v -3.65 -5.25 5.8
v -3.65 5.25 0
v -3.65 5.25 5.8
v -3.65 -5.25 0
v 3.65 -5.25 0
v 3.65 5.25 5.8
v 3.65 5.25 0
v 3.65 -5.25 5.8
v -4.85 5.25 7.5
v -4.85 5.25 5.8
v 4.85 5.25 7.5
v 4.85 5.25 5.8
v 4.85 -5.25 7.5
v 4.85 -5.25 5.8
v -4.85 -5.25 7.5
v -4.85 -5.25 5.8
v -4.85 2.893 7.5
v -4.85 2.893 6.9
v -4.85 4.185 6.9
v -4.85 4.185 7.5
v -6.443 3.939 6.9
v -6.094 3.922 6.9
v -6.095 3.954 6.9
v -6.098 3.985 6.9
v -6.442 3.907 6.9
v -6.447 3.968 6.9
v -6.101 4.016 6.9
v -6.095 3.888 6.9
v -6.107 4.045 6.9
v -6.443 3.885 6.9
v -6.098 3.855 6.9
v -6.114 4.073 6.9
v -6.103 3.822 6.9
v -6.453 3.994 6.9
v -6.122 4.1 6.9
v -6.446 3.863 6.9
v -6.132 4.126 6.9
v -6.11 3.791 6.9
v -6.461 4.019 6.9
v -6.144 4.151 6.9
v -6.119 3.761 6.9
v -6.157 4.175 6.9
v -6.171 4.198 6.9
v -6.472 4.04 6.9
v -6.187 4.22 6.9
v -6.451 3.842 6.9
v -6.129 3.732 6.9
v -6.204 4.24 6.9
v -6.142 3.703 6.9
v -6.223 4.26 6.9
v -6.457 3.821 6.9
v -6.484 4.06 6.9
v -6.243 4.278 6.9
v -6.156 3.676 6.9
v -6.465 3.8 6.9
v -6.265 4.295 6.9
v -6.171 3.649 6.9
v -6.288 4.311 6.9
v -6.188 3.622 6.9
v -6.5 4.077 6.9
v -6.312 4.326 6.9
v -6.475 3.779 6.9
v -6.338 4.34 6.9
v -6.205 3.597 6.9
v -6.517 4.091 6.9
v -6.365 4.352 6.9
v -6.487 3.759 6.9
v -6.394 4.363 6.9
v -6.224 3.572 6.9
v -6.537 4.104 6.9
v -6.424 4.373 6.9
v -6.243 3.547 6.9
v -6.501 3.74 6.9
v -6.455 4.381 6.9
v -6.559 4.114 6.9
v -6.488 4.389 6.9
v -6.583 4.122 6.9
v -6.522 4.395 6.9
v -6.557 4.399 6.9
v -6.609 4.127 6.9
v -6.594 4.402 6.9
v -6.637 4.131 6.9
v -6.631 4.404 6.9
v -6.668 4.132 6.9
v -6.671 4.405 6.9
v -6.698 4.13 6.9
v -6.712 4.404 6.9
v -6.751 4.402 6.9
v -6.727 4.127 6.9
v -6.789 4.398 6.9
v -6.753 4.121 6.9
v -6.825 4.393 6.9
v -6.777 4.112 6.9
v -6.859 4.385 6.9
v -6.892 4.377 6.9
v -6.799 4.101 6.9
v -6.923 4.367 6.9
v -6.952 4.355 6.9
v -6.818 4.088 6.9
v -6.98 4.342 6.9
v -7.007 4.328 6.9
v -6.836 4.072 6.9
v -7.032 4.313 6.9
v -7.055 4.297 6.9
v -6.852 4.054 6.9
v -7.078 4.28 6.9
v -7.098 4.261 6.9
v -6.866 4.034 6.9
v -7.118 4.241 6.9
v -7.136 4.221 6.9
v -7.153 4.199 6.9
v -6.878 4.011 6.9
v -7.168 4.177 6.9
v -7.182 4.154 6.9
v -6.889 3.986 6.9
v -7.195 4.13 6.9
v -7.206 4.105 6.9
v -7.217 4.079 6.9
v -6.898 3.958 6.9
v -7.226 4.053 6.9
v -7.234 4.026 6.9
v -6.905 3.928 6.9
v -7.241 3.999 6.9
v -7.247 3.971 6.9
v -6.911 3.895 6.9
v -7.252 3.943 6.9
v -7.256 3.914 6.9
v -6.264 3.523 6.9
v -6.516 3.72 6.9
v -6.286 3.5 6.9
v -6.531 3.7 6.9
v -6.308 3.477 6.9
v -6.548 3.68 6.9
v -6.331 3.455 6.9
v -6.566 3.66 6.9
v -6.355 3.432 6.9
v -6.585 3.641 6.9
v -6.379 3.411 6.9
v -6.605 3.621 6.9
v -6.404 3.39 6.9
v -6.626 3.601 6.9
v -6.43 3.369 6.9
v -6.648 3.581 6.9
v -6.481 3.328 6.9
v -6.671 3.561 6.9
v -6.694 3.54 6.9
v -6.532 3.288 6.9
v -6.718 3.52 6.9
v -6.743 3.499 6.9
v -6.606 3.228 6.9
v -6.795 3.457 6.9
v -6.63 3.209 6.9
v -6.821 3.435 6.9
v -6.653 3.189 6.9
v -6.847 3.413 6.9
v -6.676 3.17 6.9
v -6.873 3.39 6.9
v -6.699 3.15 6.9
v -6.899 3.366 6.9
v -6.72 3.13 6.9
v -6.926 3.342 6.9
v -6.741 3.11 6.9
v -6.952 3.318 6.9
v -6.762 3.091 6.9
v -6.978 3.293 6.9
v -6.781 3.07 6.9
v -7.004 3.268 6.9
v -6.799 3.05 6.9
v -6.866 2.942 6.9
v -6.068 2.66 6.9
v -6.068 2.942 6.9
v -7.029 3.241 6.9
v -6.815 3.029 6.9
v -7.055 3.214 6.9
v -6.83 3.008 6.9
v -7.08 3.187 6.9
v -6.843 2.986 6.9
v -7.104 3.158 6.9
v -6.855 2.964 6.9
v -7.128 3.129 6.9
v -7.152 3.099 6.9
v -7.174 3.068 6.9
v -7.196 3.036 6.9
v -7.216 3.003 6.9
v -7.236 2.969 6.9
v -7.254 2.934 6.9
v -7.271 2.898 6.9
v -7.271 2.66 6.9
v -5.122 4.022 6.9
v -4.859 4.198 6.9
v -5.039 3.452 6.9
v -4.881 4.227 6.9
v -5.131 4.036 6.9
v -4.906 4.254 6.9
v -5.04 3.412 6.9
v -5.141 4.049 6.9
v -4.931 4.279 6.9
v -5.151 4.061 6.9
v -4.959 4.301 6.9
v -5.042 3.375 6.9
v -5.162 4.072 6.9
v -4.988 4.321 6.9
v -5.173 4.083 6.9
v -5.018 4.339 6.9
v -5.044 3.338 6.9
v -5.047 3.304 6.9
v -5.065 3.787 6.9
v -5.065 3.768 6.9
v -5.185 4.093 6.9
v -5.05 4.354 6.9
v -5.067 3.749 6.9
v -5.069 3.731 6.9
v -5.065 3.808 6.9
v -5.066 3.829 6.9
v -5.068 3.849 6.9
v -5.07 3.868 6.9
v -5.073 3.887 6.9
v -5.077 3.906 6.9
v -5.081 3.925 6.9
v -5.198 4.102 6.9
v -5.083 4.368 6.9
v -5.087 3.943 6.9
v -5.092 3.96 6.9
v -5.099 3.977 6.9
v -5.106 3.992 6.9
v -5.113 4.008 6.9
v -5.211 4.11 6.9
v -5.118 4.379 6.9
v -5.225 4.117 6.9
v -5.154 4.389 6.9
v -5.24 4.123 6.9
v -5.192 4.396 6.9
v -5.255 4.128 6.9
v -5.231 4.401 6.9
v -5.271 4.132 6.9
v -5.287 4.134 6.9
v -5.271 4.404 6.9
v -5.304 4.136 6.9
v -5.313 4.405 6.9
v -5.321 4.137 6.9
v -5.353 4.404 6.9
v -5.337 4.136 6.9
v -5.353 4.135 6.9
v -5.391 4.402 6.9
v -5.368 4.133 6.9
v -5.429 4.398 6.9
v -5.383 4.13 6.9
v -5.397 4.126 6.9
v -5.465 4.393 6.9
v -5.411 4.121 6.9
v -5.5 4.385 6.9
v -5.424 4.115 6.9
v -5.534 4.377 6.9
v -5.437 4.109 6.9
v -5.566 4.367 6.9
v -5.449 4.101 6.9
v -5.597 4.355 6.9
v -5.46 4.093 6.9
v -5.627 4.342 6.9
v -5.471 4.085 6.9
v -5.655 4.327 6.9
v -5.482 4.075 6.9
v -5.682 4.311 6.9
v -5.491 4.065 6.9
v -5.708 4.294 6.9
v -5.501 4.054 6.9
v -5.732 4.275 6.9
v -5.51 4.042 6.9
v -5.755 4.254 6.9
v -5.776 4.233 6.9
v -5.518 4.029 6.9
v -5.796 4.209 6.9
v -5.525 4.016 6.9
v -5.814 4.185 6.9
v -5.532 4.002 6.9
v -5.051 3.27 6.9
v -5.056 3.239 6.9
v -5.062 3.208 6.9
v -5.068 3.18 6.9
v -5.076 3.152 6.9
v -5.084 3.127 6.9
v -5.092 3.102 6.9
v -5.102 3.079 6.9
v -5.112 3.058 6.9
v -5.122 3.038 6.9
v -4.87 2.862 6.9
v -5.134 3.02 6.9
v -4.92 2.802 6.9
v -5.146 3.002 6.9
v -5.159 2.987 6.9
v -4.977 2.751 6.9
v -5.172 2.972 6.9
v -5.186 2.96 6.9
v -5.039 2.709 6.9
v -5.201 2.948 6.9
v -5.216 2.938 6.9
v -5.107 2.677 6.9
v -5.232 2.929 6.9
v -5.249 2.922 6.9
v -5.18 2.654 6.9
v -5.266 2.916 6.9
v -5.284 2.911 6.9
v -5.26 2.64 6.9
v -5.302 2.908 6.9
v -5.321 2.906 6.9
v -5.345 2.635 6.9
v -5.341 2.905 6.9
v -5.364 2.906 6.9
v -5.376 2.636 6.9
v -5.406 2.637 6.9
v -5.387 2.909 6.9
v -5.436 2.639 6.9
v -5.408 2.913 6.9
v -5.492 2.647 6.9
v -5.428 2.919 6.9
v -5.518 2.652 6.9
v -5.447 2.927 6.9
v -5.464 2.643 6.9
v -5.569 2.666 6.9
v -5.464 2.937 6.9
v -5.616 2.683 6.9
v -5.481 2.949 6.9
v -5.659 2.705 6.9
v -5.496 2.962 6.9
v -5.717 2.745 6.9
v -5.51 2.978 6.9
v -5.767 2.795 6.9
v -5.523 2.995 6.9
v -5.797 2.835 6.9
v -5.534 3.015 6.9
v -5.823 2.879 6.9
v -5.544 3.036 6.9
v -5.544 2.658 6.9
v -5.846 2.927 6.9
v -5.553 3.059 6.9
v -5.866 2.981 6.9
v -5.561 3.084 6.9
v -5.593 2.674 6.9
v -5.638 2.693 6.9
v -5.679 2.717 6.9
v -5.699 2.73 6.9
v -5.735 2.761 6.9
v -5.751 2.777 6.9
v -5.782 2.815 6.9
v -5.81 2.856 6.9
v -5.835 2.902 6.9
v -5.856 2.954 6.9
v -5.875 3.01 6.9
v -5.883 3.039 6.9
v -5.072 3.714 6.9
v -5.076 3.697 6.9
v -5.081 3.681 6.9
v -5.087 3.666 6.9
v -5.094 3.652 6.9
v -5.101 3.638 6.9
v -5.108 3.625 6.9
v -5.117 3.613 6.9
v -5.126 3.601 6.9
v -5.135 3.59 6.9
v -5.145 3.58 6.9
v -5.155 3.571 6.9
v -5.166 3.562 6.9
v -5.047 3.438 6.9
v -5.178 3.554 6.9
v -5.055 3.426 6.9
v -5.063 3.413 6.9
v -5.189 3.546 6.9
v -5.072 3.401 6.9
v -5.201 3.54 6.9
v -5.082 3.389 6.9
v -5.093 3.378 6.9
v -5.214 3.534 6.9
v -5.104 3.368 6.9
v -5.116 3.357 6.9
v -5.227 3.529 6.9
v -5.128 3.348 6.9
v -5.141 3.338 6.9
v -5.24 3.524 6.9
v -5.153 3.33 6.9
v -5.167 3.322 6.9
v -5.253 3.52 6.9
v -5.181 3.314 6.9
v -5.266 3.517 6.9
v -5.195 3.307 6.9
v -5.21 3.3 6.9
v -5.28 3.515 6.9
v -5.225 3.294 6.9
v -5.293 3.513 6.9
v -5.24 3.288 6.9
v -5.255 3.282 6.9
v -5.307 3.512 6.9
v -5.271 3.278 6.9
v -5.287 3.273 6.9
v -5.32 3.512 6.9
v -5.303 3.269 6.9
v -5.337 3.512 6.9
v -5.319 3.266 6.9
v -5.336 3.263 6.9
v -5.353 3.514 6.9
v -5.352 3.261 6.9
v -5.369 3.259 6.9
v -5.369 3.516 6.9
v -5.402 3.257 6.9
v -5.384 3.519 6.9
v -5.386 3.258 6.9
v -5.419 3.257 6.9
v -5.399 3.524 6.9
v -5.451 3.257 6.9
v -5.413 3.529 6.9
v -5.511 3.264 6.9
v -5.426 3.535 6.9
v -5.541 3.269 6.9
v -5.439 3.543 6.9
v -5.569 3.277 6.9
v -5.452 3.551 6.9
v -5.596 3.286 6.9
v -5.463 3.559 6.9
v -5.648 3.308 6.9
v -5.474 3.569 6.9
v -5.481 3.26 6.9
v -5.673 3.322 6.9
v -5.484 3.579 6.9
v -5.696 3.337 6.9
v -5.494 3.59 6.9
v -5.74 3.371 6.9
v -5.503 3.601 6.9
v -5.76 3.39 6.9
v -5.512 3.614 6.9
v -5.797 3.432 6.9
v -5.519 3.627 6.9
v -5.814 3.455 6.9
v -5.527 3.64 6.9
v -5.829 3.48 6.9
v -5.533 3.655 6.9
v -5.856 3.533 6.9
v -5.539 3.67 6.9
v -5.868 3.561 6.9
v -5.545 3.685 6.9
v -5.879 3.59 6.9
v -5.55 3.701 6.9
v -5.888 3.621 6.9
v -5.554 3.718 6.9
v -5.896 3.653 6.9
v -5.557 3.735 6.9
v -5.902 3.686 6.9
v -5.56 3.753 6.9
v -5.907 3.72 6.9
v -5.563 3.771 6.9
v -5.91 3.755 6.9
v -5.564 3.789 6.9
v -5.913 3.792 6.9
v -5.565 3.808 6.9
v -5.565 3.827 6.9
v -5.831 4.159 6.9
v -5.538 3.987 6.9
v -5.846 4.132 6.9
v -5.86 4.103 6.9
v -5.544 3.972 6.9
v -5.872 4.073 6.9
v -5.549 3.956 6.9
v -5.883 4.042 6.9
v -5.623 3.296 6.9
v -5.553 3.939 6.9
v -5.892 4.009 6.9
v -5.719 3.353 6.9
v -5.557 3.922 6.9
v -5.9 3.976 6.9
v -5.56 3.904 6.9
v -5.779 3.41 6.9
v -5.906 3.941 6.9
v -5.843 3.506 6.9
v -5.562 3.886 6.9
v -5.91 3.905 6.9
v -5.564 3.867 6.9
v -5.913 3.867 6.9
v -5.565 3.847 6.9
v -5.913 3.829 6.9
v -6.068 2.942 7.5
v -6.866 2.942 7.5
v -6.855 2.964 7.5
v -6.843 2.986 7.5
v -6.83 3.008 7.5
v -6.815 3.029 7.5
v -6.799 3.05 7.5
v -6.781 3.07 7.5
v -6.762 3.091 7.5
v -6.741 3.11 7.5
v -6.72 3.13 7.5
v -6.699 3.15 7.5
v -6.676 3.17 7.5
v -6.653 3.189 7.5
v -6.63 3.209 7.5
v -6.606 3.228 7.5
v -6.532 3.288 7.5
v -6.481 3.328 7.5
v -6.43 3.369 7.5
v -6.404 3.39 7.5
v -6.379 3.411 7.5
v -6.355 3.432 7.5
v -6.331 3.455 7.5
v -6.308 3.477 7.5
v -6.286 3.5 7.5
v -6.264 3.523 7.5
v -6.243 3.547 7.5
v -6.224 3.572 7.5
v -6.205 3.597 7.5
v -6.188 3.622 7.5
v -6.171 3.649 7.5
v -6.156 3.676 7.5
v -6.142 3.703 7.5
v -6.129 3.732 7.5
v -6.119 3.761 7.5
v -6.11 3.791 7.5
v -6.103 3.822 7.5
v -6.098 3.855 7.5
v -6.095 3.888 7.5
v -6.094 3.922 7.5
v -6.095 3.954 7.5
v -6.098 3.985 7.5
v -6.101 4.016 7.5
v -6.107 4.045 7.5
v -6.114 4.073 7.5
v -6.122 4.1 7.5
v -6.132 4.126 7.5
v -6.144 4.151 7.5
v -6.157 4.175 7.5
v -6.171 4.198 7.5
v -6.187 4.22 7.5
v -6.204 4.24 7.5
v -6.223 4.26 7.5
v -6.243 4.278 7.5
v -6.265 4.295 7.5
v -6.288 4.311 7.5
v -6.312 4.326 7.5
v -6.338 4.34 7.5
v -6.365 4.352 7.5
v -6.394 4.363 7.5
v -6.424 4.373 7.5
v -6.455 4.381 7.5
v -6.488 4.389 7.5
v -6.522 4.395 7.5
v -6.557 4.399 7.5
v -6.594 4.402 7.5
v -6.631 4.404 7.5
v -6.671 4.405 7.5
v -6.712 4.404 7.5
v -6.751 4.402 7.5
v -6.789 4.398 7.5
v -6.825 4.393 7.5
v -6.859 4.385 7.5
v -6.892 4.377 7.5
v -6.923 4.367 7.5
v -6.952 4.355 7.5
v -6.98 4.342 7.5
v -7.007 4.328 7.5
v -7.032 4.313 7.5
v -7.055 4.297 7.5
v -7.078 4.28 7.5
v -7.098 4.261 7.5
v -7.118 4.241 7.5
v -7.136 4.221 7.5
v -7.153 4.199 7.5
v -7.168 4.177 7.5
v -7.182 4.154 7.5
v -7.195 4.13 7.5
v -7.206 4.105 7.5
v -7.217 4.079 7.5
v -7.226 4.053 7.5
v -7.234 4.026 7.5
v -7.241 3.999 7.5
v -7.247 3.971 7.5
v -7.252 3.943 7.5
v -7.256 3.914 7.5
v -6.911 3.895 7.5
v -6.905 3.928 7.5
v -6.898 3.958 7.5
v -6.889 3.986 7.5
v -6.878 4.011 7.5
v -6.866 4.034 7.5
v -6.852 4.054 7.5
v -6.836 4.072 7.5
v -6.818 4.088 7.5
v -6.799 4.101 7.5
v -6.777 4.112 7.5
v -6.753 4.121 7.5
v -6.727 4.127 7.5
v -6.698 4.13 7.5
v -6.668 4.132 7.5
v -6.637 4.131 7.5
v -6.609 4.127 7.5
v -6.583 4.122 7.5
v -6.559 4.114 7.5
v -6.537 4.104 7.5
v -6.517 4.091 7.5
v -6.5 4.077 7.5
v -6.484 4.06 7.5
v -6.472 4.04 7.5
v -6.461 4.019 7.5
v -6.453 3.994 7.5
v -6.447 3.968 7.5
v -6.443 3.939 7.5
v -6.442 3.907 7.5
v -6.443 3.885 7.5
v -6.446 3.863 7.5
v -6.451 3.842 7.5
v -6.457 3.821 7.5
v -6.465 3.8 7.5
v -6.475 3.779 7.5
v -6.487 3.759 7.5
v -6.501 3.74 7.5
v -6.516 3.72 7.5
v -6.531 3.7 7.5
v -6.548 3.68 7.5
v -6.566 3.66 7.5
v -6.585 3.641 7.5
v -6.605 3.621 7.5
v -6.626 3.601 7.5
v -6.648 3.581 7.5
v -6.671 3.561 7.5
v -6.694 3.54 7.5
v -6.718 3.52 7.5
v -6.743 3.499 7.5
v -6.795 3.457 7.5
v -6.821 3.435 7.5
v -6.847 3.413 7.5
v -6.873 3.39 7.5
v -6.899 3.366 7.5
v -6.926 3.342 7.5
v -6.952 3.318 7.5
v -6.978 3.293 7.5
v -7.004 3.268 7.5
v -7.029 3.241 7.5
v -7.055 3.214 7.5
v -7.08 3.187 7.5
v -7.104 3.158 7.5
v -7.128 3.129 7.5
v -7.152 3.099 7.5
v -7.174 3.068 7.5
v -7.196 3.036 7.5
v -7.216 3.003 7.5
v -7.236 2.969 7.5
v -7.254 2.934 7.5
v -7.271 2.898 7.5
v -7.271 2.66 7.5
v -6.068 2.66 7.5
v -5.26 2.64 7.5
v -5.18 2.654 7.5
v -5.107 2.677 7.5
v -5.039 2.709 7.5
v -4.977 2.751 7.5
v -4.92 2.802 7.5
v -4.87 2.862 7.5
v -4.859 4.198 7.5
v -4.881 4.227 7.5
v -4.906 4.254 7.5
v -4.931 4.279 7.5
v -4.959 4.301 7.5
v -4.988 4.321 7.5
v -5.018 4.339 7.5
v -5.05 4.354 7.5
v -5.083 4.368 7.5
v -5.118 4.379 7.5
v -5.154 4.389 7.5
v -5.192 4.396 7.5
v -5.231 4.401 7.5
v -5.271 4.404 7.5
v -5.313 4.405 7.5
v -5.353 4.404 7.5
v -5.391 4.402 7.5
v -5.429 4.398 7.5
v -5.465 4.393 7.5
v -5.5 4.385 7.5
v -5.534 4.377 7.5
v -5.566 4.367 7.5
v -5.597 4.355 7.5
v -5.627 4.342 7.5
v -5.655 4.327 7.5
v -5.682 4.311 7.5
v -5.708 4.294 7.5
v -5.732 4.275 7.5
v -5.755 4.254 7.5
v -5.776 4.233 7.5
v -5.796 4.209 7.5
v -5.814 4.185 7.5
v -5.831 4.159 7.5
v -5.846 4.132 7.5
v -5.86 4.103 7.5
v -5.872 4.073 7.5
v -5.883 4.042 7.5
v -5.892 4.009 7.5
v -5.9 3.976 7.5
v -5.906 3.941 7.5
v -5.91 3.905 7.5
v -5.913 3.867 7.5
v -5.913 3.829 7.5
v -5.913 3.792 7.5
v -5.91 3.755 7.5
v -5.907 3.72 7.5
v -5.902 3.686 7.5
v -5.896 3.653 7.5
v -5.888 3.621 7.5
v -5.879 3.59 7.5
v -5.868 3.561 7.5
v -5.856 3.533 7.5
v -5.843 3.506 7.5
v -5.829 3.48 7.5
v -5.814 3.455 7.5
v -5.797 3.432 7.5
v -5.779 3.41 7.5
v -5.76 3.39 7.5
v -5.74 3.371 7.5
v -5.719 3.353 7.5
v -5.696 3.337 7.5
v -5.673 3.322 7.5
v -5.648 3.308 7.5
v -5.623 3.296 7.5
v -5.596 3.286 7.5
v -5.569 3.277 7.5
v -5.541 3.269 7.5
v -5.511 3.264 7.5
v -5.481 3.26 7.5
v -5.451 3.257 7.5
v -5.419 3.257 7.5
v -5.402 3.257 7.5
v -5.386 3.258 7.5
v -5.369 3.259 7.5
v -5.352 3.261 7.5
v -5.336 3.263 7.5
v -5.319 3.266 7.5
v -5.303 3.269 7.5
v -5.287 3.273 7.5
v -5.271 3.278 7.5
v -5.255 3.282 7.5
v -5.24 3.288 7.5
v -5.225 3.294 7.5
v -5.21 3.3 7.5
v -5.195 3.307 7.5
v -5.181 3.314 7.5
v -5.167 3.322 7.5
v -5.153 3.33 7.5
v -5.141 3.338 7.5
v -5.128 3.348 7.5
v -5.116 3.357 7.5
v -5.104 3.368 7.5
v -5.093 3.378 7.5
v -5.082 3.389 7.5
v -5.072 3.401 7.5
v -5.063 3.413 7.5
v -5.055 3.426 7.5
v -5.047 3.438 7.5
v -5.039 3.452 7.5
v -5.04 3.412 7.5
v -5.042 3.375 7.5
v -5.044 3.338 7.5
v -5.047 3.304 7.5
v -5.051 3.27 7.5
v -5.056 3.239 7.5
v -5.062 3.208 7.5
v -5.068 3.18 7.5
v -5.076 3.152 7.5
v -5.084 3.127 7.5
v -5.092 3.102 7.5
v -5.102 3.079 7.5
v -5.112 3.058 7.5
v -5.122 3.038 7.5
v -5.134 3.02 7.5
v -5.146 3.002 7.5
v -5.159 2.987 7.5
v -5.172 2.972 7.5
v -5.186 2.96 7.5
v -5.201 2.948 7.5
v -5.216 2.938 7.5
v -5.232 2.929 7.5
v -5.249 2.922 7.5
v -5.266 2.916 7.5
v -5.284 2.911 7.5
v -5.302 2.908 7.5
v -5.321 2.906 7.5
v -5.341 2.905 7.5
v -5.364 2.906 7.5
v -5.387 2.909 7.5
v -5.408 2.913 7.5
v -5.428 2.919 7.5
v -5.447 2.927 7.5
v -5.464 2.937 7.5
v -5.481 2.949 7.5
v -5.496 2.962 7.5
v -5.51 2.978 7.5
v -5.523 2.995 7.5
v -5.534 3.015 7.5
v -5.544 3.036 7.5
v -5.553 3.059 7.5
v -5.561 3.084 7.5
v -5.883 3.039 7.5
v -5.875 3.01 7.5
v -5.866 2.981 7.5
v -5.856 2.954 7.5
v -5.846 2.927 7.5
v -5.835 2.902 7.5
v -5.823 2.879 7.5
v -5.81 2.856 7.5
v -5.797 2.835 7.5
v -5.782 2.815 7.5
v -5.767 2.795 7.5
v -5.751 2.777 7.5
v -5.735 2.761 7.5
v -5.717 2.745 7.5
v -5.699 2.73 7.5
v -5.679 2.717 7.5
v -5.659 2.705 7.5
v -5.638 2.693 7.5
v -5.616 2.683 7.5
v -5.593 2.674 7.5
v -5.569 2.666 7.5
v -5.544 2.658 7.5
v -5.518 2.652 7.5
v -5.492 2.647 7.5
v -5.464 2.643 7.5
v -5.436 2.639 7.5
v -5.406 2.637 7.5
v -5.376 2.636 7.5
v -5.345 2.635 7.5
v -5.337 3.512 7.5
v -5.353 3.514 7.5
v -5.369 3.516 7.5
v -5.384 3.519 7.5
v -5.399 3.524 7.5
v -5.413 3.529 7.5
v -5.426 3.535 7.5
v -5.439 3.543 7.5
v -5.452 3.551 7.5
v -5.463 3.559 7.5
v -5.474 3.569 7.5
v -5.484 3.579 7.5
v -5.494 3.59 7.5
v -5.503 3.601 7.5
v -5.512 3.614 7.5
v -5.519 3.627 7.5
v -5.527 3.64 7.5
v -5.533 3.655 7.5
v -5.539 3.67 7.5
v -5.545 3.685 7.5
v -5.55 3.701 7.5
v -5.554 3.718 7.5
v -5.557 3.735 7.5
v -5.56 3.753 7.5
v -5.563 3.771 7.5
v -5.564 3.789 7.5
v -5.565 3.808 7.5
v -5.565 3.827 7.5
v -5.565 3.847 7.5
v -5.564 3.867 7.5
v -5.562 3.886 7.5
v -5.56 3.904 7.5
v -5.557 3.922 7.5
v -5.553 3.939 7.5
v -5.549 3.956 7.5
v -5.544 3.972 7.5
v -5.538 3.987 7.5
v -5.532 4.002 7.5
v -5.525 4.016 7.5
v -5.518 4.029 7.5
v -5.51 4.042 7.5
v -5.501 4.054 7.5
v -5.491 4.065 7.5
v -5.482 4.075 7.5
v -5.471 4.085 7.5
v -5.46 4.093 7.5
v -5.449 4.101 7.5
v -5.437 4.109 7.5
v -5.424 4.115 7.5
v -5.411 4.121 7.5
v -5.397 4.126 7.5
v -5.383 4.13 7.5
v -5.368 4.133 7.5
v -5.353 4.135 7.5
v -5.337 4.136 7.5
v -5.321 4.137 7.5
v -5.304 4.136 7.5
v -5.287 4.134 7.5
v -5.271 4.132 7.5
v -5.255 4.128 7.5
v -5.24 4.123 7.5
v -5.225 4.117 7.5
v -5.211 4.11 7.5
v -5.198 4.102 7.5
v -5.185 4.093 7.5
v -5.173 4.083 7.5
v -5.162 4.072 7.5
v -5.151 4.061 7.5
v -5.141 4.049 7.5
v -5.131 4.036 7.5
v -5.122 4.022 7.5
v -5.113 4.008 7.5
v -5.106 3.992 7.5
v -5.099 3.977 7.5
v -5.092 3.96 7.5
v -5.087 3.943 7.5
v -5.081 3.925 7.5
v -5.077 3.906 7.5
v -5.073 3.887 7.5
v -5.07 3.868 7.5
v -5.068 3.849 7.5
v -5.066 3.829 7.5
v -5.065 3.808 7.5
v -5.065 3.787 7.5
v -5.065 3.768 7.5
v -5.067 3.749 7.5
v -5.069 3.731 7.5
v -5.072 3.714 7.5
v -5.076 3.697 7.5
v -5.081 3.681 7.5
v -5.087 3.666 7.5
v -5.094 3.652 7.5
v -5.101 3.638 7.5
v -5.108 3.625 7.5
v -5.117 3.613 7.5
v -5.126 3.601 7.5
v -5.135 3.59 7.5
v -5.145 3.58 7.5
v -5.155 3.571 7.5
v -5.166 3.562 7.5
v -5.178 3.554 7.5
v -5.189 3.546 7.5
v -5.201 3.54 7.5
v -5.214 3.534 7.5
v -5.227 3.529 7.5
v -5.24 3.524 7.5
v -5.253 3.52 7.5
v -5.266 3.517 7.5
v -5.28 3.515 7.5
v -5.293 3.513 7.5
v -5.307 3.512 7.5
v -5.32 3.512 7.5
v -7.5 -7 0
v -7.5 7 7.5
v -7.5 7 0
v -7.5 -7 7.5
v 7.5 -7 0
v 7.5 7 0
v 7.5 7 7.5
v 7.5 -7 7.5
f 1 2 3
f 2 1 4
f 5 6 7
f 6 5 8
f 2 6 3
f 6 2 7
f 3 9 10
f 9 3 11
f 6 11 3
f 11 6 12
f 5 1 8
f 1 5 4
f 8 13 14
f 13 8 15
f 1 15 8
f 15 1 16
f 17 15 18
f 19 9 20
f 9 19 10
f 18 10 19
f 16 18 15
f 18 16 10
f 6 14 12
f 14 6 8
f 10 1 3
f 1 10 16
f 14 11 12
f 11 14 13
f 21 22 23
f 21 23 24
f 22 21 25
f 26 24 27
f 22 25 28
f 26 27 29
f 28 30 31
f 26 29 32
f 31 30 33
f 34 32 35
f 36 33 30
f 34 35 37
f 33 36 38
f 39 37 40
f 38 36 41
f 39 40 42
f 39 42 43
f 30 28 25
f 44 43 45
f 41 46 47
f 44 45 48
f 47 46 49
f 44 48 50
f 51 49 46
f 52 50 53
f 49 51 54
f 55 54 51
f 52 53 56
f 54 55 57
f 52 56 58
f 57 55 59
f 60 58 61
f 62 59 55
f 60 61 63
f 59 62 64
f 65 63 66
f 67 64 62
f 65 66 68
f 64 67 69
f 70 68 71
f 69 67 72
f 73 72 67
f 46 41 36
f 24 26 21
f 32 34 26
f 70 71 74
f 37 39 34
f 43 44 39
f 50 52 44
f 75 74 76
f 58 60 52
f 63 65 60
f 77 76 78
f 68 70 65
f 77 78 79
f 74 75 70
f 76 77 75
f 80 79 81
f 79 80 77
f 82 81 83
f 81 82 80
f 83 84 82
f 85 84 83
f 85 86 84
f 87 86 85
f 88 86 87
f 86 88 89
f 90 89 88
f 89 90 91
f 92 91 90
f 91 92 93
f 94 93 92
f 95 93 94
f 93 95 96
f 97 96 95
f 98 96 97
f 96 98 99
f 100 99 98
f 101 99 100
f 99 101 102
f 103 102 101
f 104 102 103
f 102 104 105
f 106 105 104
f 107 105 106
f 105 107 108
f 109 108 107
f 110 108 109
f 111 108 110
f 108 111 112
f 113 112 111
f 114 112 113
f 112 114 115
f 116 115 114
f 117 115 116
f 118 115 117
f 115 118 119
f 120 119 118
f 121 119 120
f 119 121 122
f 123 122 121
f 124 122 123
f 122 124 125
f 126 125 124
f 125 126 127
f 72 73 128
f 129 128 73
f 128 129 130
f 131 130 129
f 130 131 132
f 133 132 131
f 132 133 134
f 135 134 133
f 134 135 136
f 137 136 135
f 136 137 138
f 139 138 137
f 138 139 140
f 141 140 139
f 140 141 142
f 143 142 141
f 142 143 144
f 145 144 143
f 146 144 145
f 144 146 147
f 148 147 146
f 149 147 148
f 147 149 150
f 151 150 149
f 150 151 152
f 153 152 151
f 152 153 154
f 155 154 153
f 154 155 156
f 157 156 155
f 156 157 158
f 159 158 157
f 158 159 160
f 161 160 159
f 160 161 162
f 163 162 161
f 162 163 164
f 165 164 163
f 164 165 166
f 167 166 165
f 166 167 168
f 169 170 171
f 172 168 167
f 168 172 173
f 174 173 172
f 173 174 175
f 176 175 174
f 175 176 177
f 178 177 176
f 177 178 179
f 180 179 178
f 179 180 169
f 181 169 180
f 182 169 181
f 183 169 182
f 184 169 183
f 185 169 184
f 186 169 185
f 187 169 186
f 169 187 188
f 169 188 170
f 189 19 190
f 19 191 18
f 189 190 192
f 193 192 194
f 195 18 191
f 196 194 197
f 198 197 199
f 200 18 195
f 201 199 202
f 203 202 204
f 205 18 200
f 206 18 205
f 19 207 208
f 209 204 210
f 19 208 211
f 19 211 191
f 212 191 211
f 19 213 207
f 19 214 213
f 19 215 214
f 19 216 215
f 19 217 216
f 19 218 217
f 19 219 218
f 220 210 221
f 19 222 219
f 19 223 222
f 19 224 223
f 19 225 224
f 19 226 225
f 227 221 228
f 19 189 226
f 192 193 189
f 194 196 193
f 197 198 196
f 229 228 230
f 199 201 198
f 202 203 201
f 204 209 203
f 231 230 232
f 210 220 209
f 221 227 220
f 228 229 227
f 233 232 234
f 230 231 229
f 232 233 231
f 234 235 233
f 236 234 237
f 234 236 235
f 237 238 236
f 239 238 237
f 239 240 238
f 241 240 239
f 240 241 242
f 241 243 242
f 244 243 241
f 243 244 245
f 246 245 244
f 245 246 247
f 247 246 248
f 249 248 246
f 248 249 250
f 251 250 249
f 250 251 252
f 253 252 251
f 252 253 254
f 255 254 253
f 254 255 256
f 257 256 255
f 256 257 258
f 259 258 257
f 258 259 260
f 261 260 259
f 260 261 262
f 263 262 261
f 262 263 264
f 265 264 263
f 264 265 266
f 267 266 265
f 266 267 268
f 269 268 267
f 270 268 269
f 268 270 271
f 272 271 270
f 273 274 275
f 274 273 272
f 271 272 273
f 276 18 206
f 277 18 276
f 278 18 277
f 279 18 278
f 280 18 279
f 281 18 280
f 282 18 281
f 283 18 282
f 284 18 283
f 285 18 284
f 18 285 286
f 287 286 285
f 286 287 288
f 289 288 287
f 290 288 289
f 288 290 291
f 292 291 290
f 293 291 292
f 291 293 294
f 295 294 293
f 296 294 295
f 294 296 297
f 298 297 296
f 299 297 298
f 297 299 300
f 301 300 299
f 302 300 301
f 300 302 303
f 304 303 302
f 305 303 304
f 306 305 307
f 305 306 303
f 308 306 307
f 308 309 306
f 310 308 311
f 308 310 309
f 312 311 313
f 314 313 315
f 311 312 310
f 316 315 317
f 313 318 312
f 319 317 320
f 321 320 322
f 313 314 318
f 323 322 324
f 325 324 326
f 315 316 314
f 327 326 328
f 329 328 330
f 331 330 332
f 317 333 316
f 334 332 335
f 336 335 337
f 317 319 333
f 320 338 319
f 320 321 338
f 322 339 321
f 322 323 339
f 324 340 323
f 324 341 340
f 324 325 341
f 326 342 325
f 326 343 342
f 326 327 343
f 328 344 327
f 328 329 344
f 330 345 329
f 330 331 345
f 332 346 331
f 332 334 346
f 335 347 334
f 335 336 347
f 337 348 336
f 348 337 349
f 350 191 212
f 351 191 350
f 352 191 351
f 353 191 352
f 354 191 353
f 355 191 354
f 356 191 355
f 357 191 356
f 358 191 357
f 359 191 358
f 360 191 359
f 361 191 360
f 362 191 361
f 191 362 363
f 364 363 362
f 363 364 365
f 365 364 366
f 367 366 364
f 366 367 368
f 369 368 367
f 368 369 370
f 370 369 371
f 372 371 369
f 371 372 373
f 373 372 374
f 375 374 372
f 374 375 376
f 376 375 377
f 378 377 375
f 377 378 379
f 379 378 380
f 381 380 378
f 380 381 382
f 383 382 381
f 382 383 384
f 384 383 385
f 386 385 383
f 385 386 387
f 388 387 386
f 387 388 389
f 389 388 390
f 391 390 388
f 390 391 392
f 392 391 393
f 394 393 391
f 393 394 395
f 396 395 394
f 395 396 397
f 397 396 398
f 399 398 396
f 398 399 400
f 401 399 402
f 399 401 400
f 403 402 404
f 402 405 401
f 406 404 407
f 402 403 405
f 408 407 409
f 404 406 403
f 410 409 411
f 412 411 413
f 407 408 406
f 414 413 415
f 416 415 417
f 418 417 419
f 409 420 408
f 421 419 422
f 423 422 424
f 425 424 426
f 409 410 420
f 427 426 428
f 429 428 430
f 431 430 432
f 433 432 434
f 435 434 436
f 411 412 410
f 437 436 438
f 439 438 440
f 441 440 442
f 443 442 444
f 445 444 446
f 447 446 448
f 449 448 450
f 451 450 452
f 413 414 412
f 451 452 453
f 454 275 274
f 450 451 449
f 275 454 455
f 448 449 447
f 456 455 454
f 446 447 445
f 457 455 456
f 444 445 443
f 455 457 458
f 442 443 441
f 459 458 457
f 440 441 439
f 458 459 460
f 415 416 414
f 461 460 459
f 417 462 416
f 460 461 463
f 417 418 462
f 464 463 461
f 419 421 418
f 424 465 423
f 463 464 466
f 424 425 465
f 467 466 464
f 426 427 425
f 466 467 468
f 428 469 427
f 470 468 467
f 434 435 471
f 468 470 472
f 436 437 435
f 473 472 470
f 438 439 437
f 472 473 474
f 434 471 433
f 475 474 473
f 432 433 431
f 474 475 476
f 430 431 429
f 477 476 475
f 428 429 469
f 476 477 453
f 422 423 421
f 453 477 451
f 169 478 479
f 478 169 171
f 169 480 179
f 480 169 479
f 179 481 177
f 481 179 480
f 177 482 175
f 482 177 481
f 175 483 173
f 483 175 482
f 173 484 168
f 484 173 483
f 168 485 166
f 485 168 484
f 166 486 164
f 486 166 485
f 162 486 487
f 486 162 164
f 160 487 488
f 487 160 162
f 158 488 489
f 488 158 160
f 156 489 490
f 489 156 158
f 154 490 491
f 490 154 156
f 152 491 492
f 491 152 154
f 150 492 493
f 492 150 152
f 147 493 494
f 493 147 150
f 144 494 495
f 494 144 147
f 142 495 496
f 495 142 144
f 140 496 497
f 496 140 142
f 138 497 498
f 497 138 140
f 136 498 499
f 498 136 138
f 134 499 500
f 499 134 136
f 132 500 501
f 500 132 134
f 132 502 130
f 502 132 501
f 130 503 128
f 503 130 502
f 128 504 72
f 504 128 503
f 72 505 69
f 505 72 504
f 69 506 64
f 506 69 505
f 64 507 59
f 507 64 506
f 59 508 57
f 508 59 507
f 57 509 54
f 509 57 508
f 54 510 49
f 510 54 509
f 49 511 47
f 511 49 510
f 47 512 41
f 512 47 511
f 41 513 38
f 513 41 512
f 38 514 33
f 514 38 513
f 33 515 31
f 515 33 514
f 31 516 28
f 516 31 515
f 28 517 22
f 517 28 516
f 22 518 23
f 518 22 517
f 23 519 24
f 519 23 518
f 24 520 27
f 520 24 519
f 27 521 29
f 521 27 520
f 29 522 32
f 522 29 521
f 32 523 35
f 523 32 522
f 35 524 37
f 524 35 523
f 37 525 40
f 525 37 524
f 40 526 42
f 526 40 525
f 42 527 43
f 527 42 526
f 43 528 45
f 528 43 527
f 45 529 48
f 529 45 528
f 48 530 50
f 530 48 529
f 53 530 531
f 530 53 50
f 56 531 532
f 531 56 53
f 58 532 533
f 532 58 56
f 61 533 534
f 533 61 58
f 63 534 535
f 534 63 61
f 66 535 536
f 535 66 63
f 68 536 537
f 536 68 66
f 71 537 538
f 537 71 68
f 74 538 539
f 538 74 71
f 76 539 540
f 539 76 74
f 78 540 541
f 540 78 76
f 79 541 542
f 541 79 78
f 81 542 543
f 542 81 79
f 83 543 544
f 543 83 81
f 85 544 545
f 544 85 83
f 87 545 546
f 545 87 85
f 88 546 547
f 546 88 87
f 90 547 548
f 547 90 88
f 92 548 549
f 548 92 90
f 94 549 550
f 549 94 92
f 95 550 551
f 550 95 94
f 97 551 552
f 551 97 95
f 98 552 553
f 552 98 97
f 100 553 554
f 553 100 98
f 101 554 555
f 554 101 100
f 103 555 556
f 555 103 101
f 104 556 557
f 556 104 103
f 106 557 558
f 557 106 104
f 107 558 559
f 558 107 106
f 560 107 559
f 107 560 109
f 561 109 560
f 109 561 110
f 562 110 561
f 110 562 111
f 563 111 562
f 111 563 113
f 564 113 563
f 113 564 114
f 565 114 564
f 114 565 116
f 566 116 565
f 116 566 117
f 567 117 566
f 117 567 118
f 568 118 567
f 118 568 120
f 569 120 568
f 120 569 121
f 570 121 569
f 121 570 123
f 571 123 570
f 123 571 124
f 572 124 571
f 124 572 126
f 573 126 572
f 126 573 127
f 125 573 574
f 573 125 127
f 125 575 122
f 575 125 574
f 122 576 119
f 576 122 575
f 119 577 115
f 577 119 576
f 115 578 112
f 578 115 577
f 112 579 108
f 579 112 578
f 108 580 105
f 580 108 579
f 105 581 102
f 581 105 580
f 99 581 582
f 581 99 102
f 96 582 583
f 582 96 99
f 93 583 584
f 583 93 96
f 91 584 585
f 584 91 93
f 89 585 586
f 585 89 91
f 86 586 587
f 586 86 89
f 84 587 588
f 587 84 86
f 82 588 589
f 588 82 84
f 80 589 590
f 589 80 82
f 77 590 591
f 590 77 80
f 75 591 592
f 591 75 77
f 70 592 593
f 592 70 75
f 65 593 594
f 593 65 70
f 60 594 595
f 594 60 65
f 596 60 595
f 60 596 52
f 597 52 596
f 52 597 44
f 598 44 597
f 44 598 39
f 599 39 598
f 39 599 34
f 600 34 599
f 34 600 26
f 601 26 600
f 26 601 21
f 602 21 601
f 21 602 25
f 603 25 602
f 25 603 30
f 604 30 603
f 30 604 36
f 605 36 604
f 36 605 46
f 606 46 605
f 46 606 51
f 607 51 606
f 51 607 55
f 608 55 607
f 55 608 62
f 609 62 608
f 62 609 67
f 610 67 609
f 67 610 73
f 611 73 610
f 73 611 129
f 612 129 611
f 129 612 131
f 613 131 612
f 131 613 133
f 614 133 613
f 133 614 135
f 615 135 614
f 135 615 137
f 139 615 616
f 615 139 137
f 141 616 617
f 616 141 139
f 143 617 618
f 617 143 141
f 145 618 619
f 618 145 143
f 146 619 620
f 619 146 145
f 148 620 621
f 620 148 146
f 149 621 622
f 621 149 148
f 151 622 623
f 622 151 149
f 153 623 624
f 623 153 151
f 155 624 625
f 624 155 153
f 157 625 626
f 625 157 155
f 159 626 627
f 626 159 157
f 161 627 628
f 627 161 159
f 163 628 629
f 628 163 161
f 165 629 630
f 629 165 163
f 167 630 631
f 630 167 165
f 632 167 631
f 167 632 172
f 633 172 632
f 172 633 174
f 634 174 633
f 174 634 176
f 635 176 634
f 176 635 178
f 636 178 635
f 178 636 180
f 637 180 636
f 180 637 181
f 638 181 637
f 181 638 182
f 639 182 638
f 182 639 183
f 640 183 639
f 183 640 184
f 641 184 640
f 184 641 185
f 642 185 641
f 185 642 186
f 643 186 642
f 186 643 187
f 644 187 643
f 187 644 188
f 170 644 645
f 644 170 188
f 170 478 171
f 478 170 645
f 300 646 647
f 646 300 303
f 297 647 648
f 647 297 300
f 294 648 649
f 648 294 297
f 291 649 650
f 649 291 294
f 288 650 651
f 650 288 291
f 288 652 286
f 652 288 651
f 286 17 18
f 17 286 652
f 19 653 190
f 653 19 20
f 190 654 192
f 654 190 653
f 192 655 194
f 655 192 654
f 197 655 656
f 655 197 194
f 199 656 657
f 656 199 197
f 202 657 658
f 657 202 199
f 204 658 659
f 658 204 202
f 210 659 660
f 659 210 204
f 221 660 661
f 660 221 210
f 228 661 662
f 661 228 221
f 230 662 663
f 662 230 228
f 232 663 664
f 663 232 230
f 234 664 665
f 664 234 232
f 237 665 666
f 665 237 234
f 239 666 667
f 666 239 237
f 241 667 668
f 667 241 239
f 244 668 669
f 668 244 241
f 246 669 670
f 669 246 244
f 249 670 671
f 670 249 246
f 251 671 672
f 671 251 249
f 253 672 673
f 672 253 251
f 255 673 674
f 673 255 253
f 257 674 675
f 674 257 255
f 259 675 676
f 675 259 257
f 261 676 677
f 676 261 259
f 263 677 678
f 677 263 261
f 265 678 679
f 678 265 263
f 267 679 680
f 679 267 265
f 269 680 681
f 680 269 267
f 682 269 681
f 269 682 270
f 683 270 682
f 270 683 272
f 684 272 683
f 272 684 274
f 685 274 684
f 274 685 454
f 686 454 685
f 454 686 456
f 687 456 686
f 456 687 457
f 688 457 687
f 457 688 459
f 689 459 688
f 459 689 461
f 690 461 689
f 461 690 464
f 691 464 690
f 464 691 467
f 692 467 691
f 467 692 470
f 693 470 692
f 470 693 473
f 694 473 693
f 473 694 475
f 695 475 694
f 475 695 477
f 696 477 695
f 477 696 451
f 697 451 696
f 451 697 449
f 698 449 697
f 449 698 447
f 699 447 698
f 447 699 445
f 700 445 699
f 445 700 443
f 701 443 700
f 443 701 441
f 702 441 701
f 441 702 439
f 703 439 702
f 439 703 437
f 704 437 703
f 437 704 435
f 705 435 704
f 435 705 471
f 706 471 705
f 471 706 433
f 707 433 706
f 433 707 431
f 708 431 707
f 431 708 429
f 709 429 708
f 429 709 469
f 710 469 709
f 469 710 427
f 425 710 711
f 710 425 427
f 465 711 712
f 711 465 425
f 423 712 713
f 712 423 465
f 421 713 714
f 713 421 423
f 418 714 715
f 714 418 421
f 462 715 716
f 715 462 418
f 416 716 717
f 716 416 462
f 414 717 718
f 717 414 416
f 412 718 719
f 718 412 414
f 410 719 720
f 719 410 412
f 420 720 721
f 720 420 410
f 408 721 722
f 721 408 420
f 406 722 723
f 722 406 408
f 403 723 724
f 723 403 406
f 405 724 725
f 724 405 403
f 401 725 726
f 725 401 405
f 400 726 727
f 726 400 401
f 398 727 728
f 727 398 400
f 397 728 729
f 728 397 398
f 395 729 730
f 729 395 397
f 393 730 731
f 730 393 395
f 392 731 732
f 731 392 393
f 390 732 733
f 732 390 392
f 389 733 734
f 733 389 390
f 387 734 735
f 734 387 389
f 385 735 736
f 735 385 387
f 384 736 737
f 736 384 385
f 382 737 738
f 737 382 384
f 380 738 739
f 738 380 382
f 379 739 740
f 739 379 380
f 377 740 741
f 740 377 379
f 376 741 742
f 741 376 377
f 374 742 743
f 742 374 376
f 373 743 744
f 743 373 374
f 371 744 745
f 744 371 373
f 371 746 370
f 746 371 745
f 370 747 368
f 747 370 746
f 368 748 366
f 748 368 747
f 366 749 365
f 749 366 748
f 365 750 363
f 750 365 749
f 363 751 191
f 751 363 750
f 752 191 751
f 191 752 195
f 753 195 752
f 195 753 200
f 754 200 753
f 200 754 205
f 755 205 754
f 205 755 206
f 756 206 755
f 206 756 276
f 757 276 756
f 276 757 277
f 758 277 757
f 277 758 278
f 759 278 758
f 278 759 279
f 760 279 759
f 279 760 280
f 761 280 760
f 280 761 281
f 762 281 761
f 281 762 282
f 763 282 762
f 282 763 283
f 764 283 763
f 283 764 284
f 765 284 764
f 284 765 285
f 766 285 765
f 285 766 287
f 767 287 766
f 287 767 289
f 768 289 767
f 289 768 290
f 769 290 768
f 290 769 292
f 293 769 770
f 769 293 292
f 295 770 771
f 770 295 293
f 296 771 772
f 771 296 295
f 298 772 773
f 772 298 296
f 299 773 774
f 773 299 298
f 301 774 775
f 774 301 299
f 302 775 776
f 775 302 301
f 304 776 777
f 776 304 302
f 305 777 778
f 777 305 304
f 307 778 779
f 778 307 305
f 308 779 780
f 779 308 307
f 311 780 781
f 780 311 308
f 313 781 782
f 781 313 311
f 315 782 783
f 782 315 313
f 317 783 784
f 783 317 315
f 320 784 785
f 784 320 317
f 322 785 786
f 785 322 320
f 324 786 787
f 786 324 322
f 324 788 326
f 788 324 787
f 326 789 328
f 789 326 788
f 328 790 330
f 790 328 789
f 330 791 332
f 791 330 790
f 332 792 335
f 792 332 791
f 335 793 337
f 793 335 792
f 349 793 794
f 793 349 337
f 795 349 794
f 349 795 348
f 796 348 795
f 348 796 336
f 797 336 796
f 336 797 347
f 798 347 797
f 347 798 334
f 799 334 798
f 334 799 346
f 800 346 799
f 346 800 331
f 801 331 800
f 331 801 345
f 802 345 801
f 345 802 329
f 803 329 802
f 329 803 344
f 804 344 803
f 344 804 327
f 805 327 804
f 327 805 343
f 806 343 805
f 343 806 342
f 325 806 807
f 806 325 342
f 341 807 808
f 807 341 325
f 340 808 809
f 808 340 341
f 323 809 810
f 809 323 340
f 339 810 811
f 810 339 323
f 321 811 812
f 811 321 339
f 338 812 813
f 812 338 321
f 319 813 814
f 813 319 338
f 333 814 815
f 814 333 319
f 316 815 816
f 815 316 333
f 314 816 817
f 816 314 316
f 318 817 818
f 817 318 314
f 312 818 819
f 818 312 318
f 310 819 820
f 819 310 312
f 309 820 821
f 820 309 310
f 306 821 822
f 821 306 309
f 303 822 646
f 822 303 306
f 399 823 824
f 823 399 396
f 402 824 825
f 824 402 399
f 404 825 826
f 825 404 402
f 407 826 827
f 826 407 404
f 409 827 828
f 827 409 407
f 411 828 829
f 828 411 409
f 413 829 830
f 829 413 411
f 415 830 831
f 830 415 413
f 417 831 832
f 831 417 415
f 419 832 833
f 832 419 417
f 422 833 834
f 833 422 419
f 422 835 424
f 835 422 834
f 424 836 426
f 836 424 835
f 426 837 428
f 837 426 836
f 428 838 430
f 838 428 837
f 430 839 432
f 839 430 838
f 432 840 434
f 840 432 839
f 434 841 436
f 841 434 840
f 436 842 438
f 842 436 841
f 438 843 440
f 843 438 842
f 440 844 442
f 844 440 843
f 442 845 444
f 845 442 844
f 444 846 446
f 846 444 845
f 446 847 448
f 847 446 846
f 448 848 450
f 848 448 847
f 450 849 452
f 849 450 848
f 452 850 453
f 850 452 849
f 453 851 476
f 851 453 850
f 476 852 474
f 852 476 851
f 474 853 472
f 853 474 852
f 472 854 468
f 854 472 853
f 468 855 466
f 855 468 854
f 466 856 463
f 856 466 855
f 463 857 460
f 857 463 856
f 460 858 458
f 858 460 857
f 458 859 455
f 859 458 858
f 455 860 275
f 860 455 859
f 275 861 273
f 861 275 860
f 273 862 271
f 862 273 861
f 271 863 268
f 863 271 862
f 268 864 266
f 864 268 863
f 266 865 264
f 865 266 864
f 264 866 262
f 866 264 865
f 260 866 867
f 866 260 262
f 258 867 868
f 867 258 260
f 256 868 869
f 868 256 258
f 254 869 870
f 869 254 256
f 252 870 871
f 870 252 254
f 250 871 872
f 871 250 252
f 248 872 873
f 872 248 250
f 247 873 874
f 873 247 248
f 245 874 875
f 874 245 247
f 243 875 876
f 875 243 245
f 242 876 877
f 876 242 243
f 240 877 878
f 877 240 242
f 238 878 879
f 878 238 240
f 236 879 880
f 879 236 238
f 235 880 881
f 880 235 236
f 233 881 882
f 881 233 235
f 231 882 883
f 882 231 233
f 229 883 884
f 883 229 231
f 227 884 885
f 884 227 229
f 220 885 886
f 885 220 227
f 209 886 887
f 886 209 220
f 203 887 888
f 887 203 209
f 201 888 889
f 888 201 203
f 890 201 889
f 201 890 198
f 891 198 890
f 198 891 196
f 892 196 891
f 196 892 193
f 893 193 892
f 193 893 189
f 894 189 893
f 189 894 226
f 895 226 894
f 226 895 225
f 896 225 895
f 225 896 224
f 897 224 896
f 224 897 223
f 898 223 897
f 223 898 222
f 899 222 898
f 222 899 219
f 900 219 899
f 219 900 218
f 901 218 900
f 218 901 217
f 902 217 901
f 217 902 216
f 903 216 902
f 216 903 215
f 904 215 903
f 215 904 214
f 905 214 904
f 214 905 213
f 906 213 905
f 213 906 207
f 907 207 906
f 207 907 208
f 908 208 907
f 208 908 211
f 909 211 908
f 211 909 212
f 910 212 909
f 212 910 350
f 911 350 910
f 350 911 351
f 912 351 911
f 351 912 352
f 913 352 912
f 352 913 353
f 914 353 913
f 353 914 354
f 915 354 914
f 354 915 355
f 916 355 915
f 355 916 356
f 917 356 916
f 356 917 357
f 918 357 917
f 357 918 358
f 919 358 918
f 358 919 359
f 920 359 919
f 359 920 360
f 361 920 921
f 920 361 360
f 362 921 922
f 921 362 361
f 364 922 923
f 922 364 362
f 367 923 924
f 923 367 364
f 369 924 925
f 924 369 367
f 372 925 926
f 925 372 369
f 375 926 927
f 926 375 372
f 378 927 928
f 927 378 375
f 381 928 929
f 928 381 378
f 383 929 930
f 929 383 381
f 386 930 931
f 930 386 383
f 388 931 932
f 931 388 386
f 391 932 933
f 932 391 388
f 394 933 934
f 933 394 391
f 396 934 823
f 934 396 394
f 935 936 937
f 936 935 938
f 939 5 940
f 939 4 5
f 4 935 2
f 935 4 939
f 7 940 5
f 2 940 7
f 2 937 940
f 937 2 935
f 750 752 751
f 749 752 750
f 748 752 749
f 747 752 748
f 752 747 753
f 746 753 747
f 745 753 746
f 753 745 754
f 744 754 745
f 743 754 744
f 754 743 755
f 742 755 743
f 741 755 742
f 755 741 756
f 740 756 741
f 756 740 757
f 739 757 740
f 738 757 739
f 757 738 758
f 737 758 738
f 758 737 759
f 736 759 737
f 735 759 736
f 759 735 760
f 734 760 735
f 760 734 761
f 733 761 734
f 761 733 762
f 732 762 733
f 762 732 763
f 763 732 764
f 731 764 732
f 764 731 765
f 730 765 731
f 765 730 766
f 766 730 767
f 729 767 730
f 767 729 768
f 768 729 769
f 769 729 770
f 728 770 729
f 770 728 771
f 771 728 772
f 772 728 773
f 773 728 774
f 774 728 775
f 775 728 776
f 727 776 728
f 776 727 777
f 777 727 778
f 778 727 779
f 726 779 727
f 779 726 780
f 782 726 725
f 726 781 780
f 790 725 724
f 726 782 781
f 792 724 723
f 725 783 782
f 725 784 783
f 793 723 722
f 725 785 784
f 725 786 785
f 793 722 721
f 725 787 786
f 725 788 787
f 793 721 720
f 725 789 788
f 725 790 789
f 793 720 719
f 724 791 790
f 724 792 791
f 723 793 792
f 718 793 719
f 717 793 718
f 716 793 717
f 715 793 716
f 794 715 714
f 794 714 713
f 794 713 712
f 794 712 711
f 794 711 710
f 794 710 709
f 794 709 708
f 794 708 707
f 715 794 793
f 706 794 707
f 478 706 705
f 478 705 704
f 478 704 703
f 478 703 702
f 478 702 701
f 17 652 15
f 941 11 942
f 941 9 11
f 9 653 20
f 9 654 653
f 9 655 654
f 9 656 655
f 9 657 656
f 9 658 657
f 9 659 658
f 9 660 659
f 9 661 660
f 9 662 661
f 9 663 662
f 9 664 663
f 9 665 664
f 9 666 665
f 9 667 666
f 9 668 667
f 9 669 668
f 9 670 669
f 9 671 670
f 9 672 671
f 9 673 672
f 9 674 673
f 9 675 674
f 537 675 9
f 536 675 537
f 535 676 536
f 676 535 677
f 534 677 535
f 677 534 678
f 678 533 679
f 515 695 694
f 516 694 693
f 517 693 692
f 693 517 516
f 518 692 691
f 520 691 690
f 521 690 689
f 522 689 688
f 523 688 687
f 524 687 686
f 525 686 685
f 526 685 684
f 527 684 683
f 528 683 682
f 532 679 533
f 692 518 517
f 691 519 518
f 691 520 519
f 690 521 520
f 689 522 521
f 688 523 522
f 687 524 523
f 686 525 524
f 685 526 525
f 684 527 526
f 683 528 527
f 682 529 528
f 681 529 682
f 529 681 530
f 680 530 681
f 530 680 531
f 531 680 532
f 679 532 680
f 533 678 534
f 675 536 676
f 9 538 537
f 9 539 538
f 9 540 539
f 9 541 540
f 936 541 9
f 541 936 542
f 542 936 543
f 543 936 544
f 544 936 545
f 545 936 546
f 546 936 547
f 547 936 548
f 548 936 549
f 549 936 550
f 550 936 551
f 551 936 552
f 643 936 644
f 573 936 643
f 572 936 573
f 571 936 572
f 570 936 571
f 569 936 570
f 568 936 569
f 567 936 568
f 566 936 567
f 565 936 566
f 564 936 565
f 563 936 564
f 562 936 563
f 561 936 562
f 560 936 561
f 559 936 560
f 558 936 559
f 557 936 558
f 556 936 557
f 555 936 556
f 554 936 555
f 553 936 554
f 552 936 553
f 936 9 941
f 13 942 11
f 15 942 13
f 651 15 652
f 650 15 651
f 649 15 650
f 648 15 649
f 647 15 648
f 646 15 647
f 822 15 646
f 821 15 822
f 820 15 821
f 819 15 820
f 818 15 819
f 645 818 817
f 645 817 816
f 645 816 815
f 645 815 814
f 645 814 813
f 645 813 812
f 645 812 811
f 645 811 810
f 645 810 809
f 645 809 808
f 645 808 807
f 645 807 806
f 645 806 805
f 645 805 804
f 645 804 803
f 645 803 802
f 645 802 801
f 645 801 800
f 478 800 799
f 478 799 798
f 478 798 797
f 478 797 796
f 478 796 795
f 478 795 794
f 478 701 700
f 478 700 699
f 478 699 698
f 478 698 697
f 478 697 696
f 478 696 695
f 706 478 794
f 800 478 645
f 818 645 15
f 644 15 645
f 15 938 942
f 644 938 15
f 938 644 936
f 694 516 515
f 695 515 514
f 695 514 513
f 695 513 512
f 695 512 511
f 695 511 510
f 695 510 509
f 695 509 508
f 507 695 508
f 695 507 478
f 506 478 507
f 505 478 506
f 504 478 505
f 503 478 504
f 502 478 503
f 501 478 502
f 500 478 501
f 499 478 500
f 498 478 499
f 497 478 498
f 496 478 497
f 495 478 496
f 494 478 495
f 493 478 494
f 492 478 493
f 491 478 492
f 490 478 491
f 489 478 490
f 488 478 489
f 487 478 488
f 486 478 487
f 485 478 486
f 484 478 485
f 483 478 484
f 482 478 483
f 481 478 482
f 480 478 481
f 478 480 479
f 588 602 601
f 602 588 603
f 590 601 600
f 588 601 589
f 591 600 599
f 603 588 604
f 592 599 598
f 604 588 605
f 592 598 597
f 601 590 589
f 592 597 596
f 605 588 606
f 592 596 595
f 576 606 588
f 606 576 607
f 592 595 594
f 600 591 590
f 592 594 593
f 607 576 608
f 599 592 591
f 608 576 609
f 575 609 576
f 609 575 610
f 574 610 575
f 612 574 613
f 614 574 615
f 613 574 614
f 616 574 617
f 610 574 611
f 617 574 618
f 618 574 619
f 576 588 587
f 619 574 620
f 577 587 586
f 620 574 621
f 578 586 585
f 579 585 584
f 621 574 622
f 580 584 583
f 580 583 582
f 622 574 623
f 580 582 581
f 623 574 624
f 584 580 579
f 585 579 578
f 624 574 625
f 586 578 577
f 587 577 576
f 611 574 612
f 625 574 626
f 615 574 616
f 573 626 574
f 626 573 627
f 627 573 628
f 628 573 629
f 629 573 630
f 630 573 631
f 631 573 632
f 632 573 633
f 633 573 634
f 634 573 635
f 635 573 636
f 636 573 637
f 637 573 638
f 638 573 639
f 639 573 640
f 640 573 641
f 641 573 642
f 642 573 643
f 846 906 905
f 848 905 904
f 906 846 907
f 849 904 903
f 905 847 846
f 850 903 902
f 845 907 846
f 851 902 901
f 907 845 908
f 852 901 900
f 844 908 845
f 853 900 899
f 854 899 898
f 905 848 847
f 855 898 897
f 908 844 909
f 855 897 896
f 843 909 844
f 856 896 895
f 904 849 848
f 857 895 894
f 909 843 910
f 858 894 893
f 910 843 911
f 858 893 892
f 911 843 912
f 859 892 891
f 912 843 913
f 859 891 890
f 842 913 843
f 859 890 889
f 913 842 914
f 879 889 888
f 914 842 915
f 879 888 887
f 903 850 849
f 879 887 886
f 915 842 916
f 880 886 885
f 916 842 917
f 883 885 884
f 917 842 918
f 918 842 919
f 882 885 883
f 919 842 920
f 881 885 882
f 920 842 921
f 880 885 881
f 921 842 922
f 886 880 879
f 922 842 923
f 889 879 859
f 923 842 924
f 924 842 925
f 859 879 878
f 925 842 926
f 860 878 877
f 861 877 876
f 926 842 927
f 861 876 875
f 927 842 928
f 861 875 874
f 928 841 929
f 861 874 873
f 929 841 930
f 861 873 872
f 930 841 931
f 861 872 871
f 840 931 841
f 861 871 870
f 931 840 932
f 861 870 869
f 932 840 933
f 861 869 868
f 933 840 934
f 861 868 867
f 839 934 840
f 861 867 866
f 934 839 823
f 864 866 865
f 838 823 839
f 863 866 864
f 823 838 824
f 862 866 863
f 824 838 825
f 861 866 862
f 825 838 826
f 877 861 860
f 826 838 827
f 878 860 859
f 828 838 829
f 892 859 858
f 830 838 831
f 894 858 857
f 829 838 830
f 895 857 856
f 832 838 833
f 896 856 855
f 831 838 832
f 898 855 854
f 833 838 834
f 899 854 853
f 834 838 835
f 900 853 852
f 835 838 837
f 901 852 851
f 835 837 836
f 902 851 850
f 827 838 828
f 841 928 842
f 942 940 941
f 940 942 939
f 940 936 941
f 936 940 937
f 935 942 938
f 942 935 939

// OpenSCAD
$fn = 50;

difference() {
	union() {
		translate(v = [0, -5, 7.5]) {
			rotate(a = [0, 180, 0]) {
				difference() {
					union() {
						translate(v = [-7.5, -2.0, 0]) {
							cube(size = [15.0, 14.0, 7.5]);
						}
					}
					union() {
						translate(v = [-3.65, -0.25, -0.1]) {
							cube(size = [7.3, 10.5, 7.7]);
						}
						translate(v = [-4.85, -0.25, -0.1]) {
							cube(size = [9.7, 10.5, 1.8]);
						}
						translate(v = [6, 8.5, 0.6]) {
							rotate(a = [0, 180, 0]) {
								linear_extrude(height = 0.7) {
									text(font = "Arial:style=Bold", halign = "center", size = 1.8, text = "29", valign = "center");
								}
							}
						}
					}
				}
			}
		}
	}
	union();
}
